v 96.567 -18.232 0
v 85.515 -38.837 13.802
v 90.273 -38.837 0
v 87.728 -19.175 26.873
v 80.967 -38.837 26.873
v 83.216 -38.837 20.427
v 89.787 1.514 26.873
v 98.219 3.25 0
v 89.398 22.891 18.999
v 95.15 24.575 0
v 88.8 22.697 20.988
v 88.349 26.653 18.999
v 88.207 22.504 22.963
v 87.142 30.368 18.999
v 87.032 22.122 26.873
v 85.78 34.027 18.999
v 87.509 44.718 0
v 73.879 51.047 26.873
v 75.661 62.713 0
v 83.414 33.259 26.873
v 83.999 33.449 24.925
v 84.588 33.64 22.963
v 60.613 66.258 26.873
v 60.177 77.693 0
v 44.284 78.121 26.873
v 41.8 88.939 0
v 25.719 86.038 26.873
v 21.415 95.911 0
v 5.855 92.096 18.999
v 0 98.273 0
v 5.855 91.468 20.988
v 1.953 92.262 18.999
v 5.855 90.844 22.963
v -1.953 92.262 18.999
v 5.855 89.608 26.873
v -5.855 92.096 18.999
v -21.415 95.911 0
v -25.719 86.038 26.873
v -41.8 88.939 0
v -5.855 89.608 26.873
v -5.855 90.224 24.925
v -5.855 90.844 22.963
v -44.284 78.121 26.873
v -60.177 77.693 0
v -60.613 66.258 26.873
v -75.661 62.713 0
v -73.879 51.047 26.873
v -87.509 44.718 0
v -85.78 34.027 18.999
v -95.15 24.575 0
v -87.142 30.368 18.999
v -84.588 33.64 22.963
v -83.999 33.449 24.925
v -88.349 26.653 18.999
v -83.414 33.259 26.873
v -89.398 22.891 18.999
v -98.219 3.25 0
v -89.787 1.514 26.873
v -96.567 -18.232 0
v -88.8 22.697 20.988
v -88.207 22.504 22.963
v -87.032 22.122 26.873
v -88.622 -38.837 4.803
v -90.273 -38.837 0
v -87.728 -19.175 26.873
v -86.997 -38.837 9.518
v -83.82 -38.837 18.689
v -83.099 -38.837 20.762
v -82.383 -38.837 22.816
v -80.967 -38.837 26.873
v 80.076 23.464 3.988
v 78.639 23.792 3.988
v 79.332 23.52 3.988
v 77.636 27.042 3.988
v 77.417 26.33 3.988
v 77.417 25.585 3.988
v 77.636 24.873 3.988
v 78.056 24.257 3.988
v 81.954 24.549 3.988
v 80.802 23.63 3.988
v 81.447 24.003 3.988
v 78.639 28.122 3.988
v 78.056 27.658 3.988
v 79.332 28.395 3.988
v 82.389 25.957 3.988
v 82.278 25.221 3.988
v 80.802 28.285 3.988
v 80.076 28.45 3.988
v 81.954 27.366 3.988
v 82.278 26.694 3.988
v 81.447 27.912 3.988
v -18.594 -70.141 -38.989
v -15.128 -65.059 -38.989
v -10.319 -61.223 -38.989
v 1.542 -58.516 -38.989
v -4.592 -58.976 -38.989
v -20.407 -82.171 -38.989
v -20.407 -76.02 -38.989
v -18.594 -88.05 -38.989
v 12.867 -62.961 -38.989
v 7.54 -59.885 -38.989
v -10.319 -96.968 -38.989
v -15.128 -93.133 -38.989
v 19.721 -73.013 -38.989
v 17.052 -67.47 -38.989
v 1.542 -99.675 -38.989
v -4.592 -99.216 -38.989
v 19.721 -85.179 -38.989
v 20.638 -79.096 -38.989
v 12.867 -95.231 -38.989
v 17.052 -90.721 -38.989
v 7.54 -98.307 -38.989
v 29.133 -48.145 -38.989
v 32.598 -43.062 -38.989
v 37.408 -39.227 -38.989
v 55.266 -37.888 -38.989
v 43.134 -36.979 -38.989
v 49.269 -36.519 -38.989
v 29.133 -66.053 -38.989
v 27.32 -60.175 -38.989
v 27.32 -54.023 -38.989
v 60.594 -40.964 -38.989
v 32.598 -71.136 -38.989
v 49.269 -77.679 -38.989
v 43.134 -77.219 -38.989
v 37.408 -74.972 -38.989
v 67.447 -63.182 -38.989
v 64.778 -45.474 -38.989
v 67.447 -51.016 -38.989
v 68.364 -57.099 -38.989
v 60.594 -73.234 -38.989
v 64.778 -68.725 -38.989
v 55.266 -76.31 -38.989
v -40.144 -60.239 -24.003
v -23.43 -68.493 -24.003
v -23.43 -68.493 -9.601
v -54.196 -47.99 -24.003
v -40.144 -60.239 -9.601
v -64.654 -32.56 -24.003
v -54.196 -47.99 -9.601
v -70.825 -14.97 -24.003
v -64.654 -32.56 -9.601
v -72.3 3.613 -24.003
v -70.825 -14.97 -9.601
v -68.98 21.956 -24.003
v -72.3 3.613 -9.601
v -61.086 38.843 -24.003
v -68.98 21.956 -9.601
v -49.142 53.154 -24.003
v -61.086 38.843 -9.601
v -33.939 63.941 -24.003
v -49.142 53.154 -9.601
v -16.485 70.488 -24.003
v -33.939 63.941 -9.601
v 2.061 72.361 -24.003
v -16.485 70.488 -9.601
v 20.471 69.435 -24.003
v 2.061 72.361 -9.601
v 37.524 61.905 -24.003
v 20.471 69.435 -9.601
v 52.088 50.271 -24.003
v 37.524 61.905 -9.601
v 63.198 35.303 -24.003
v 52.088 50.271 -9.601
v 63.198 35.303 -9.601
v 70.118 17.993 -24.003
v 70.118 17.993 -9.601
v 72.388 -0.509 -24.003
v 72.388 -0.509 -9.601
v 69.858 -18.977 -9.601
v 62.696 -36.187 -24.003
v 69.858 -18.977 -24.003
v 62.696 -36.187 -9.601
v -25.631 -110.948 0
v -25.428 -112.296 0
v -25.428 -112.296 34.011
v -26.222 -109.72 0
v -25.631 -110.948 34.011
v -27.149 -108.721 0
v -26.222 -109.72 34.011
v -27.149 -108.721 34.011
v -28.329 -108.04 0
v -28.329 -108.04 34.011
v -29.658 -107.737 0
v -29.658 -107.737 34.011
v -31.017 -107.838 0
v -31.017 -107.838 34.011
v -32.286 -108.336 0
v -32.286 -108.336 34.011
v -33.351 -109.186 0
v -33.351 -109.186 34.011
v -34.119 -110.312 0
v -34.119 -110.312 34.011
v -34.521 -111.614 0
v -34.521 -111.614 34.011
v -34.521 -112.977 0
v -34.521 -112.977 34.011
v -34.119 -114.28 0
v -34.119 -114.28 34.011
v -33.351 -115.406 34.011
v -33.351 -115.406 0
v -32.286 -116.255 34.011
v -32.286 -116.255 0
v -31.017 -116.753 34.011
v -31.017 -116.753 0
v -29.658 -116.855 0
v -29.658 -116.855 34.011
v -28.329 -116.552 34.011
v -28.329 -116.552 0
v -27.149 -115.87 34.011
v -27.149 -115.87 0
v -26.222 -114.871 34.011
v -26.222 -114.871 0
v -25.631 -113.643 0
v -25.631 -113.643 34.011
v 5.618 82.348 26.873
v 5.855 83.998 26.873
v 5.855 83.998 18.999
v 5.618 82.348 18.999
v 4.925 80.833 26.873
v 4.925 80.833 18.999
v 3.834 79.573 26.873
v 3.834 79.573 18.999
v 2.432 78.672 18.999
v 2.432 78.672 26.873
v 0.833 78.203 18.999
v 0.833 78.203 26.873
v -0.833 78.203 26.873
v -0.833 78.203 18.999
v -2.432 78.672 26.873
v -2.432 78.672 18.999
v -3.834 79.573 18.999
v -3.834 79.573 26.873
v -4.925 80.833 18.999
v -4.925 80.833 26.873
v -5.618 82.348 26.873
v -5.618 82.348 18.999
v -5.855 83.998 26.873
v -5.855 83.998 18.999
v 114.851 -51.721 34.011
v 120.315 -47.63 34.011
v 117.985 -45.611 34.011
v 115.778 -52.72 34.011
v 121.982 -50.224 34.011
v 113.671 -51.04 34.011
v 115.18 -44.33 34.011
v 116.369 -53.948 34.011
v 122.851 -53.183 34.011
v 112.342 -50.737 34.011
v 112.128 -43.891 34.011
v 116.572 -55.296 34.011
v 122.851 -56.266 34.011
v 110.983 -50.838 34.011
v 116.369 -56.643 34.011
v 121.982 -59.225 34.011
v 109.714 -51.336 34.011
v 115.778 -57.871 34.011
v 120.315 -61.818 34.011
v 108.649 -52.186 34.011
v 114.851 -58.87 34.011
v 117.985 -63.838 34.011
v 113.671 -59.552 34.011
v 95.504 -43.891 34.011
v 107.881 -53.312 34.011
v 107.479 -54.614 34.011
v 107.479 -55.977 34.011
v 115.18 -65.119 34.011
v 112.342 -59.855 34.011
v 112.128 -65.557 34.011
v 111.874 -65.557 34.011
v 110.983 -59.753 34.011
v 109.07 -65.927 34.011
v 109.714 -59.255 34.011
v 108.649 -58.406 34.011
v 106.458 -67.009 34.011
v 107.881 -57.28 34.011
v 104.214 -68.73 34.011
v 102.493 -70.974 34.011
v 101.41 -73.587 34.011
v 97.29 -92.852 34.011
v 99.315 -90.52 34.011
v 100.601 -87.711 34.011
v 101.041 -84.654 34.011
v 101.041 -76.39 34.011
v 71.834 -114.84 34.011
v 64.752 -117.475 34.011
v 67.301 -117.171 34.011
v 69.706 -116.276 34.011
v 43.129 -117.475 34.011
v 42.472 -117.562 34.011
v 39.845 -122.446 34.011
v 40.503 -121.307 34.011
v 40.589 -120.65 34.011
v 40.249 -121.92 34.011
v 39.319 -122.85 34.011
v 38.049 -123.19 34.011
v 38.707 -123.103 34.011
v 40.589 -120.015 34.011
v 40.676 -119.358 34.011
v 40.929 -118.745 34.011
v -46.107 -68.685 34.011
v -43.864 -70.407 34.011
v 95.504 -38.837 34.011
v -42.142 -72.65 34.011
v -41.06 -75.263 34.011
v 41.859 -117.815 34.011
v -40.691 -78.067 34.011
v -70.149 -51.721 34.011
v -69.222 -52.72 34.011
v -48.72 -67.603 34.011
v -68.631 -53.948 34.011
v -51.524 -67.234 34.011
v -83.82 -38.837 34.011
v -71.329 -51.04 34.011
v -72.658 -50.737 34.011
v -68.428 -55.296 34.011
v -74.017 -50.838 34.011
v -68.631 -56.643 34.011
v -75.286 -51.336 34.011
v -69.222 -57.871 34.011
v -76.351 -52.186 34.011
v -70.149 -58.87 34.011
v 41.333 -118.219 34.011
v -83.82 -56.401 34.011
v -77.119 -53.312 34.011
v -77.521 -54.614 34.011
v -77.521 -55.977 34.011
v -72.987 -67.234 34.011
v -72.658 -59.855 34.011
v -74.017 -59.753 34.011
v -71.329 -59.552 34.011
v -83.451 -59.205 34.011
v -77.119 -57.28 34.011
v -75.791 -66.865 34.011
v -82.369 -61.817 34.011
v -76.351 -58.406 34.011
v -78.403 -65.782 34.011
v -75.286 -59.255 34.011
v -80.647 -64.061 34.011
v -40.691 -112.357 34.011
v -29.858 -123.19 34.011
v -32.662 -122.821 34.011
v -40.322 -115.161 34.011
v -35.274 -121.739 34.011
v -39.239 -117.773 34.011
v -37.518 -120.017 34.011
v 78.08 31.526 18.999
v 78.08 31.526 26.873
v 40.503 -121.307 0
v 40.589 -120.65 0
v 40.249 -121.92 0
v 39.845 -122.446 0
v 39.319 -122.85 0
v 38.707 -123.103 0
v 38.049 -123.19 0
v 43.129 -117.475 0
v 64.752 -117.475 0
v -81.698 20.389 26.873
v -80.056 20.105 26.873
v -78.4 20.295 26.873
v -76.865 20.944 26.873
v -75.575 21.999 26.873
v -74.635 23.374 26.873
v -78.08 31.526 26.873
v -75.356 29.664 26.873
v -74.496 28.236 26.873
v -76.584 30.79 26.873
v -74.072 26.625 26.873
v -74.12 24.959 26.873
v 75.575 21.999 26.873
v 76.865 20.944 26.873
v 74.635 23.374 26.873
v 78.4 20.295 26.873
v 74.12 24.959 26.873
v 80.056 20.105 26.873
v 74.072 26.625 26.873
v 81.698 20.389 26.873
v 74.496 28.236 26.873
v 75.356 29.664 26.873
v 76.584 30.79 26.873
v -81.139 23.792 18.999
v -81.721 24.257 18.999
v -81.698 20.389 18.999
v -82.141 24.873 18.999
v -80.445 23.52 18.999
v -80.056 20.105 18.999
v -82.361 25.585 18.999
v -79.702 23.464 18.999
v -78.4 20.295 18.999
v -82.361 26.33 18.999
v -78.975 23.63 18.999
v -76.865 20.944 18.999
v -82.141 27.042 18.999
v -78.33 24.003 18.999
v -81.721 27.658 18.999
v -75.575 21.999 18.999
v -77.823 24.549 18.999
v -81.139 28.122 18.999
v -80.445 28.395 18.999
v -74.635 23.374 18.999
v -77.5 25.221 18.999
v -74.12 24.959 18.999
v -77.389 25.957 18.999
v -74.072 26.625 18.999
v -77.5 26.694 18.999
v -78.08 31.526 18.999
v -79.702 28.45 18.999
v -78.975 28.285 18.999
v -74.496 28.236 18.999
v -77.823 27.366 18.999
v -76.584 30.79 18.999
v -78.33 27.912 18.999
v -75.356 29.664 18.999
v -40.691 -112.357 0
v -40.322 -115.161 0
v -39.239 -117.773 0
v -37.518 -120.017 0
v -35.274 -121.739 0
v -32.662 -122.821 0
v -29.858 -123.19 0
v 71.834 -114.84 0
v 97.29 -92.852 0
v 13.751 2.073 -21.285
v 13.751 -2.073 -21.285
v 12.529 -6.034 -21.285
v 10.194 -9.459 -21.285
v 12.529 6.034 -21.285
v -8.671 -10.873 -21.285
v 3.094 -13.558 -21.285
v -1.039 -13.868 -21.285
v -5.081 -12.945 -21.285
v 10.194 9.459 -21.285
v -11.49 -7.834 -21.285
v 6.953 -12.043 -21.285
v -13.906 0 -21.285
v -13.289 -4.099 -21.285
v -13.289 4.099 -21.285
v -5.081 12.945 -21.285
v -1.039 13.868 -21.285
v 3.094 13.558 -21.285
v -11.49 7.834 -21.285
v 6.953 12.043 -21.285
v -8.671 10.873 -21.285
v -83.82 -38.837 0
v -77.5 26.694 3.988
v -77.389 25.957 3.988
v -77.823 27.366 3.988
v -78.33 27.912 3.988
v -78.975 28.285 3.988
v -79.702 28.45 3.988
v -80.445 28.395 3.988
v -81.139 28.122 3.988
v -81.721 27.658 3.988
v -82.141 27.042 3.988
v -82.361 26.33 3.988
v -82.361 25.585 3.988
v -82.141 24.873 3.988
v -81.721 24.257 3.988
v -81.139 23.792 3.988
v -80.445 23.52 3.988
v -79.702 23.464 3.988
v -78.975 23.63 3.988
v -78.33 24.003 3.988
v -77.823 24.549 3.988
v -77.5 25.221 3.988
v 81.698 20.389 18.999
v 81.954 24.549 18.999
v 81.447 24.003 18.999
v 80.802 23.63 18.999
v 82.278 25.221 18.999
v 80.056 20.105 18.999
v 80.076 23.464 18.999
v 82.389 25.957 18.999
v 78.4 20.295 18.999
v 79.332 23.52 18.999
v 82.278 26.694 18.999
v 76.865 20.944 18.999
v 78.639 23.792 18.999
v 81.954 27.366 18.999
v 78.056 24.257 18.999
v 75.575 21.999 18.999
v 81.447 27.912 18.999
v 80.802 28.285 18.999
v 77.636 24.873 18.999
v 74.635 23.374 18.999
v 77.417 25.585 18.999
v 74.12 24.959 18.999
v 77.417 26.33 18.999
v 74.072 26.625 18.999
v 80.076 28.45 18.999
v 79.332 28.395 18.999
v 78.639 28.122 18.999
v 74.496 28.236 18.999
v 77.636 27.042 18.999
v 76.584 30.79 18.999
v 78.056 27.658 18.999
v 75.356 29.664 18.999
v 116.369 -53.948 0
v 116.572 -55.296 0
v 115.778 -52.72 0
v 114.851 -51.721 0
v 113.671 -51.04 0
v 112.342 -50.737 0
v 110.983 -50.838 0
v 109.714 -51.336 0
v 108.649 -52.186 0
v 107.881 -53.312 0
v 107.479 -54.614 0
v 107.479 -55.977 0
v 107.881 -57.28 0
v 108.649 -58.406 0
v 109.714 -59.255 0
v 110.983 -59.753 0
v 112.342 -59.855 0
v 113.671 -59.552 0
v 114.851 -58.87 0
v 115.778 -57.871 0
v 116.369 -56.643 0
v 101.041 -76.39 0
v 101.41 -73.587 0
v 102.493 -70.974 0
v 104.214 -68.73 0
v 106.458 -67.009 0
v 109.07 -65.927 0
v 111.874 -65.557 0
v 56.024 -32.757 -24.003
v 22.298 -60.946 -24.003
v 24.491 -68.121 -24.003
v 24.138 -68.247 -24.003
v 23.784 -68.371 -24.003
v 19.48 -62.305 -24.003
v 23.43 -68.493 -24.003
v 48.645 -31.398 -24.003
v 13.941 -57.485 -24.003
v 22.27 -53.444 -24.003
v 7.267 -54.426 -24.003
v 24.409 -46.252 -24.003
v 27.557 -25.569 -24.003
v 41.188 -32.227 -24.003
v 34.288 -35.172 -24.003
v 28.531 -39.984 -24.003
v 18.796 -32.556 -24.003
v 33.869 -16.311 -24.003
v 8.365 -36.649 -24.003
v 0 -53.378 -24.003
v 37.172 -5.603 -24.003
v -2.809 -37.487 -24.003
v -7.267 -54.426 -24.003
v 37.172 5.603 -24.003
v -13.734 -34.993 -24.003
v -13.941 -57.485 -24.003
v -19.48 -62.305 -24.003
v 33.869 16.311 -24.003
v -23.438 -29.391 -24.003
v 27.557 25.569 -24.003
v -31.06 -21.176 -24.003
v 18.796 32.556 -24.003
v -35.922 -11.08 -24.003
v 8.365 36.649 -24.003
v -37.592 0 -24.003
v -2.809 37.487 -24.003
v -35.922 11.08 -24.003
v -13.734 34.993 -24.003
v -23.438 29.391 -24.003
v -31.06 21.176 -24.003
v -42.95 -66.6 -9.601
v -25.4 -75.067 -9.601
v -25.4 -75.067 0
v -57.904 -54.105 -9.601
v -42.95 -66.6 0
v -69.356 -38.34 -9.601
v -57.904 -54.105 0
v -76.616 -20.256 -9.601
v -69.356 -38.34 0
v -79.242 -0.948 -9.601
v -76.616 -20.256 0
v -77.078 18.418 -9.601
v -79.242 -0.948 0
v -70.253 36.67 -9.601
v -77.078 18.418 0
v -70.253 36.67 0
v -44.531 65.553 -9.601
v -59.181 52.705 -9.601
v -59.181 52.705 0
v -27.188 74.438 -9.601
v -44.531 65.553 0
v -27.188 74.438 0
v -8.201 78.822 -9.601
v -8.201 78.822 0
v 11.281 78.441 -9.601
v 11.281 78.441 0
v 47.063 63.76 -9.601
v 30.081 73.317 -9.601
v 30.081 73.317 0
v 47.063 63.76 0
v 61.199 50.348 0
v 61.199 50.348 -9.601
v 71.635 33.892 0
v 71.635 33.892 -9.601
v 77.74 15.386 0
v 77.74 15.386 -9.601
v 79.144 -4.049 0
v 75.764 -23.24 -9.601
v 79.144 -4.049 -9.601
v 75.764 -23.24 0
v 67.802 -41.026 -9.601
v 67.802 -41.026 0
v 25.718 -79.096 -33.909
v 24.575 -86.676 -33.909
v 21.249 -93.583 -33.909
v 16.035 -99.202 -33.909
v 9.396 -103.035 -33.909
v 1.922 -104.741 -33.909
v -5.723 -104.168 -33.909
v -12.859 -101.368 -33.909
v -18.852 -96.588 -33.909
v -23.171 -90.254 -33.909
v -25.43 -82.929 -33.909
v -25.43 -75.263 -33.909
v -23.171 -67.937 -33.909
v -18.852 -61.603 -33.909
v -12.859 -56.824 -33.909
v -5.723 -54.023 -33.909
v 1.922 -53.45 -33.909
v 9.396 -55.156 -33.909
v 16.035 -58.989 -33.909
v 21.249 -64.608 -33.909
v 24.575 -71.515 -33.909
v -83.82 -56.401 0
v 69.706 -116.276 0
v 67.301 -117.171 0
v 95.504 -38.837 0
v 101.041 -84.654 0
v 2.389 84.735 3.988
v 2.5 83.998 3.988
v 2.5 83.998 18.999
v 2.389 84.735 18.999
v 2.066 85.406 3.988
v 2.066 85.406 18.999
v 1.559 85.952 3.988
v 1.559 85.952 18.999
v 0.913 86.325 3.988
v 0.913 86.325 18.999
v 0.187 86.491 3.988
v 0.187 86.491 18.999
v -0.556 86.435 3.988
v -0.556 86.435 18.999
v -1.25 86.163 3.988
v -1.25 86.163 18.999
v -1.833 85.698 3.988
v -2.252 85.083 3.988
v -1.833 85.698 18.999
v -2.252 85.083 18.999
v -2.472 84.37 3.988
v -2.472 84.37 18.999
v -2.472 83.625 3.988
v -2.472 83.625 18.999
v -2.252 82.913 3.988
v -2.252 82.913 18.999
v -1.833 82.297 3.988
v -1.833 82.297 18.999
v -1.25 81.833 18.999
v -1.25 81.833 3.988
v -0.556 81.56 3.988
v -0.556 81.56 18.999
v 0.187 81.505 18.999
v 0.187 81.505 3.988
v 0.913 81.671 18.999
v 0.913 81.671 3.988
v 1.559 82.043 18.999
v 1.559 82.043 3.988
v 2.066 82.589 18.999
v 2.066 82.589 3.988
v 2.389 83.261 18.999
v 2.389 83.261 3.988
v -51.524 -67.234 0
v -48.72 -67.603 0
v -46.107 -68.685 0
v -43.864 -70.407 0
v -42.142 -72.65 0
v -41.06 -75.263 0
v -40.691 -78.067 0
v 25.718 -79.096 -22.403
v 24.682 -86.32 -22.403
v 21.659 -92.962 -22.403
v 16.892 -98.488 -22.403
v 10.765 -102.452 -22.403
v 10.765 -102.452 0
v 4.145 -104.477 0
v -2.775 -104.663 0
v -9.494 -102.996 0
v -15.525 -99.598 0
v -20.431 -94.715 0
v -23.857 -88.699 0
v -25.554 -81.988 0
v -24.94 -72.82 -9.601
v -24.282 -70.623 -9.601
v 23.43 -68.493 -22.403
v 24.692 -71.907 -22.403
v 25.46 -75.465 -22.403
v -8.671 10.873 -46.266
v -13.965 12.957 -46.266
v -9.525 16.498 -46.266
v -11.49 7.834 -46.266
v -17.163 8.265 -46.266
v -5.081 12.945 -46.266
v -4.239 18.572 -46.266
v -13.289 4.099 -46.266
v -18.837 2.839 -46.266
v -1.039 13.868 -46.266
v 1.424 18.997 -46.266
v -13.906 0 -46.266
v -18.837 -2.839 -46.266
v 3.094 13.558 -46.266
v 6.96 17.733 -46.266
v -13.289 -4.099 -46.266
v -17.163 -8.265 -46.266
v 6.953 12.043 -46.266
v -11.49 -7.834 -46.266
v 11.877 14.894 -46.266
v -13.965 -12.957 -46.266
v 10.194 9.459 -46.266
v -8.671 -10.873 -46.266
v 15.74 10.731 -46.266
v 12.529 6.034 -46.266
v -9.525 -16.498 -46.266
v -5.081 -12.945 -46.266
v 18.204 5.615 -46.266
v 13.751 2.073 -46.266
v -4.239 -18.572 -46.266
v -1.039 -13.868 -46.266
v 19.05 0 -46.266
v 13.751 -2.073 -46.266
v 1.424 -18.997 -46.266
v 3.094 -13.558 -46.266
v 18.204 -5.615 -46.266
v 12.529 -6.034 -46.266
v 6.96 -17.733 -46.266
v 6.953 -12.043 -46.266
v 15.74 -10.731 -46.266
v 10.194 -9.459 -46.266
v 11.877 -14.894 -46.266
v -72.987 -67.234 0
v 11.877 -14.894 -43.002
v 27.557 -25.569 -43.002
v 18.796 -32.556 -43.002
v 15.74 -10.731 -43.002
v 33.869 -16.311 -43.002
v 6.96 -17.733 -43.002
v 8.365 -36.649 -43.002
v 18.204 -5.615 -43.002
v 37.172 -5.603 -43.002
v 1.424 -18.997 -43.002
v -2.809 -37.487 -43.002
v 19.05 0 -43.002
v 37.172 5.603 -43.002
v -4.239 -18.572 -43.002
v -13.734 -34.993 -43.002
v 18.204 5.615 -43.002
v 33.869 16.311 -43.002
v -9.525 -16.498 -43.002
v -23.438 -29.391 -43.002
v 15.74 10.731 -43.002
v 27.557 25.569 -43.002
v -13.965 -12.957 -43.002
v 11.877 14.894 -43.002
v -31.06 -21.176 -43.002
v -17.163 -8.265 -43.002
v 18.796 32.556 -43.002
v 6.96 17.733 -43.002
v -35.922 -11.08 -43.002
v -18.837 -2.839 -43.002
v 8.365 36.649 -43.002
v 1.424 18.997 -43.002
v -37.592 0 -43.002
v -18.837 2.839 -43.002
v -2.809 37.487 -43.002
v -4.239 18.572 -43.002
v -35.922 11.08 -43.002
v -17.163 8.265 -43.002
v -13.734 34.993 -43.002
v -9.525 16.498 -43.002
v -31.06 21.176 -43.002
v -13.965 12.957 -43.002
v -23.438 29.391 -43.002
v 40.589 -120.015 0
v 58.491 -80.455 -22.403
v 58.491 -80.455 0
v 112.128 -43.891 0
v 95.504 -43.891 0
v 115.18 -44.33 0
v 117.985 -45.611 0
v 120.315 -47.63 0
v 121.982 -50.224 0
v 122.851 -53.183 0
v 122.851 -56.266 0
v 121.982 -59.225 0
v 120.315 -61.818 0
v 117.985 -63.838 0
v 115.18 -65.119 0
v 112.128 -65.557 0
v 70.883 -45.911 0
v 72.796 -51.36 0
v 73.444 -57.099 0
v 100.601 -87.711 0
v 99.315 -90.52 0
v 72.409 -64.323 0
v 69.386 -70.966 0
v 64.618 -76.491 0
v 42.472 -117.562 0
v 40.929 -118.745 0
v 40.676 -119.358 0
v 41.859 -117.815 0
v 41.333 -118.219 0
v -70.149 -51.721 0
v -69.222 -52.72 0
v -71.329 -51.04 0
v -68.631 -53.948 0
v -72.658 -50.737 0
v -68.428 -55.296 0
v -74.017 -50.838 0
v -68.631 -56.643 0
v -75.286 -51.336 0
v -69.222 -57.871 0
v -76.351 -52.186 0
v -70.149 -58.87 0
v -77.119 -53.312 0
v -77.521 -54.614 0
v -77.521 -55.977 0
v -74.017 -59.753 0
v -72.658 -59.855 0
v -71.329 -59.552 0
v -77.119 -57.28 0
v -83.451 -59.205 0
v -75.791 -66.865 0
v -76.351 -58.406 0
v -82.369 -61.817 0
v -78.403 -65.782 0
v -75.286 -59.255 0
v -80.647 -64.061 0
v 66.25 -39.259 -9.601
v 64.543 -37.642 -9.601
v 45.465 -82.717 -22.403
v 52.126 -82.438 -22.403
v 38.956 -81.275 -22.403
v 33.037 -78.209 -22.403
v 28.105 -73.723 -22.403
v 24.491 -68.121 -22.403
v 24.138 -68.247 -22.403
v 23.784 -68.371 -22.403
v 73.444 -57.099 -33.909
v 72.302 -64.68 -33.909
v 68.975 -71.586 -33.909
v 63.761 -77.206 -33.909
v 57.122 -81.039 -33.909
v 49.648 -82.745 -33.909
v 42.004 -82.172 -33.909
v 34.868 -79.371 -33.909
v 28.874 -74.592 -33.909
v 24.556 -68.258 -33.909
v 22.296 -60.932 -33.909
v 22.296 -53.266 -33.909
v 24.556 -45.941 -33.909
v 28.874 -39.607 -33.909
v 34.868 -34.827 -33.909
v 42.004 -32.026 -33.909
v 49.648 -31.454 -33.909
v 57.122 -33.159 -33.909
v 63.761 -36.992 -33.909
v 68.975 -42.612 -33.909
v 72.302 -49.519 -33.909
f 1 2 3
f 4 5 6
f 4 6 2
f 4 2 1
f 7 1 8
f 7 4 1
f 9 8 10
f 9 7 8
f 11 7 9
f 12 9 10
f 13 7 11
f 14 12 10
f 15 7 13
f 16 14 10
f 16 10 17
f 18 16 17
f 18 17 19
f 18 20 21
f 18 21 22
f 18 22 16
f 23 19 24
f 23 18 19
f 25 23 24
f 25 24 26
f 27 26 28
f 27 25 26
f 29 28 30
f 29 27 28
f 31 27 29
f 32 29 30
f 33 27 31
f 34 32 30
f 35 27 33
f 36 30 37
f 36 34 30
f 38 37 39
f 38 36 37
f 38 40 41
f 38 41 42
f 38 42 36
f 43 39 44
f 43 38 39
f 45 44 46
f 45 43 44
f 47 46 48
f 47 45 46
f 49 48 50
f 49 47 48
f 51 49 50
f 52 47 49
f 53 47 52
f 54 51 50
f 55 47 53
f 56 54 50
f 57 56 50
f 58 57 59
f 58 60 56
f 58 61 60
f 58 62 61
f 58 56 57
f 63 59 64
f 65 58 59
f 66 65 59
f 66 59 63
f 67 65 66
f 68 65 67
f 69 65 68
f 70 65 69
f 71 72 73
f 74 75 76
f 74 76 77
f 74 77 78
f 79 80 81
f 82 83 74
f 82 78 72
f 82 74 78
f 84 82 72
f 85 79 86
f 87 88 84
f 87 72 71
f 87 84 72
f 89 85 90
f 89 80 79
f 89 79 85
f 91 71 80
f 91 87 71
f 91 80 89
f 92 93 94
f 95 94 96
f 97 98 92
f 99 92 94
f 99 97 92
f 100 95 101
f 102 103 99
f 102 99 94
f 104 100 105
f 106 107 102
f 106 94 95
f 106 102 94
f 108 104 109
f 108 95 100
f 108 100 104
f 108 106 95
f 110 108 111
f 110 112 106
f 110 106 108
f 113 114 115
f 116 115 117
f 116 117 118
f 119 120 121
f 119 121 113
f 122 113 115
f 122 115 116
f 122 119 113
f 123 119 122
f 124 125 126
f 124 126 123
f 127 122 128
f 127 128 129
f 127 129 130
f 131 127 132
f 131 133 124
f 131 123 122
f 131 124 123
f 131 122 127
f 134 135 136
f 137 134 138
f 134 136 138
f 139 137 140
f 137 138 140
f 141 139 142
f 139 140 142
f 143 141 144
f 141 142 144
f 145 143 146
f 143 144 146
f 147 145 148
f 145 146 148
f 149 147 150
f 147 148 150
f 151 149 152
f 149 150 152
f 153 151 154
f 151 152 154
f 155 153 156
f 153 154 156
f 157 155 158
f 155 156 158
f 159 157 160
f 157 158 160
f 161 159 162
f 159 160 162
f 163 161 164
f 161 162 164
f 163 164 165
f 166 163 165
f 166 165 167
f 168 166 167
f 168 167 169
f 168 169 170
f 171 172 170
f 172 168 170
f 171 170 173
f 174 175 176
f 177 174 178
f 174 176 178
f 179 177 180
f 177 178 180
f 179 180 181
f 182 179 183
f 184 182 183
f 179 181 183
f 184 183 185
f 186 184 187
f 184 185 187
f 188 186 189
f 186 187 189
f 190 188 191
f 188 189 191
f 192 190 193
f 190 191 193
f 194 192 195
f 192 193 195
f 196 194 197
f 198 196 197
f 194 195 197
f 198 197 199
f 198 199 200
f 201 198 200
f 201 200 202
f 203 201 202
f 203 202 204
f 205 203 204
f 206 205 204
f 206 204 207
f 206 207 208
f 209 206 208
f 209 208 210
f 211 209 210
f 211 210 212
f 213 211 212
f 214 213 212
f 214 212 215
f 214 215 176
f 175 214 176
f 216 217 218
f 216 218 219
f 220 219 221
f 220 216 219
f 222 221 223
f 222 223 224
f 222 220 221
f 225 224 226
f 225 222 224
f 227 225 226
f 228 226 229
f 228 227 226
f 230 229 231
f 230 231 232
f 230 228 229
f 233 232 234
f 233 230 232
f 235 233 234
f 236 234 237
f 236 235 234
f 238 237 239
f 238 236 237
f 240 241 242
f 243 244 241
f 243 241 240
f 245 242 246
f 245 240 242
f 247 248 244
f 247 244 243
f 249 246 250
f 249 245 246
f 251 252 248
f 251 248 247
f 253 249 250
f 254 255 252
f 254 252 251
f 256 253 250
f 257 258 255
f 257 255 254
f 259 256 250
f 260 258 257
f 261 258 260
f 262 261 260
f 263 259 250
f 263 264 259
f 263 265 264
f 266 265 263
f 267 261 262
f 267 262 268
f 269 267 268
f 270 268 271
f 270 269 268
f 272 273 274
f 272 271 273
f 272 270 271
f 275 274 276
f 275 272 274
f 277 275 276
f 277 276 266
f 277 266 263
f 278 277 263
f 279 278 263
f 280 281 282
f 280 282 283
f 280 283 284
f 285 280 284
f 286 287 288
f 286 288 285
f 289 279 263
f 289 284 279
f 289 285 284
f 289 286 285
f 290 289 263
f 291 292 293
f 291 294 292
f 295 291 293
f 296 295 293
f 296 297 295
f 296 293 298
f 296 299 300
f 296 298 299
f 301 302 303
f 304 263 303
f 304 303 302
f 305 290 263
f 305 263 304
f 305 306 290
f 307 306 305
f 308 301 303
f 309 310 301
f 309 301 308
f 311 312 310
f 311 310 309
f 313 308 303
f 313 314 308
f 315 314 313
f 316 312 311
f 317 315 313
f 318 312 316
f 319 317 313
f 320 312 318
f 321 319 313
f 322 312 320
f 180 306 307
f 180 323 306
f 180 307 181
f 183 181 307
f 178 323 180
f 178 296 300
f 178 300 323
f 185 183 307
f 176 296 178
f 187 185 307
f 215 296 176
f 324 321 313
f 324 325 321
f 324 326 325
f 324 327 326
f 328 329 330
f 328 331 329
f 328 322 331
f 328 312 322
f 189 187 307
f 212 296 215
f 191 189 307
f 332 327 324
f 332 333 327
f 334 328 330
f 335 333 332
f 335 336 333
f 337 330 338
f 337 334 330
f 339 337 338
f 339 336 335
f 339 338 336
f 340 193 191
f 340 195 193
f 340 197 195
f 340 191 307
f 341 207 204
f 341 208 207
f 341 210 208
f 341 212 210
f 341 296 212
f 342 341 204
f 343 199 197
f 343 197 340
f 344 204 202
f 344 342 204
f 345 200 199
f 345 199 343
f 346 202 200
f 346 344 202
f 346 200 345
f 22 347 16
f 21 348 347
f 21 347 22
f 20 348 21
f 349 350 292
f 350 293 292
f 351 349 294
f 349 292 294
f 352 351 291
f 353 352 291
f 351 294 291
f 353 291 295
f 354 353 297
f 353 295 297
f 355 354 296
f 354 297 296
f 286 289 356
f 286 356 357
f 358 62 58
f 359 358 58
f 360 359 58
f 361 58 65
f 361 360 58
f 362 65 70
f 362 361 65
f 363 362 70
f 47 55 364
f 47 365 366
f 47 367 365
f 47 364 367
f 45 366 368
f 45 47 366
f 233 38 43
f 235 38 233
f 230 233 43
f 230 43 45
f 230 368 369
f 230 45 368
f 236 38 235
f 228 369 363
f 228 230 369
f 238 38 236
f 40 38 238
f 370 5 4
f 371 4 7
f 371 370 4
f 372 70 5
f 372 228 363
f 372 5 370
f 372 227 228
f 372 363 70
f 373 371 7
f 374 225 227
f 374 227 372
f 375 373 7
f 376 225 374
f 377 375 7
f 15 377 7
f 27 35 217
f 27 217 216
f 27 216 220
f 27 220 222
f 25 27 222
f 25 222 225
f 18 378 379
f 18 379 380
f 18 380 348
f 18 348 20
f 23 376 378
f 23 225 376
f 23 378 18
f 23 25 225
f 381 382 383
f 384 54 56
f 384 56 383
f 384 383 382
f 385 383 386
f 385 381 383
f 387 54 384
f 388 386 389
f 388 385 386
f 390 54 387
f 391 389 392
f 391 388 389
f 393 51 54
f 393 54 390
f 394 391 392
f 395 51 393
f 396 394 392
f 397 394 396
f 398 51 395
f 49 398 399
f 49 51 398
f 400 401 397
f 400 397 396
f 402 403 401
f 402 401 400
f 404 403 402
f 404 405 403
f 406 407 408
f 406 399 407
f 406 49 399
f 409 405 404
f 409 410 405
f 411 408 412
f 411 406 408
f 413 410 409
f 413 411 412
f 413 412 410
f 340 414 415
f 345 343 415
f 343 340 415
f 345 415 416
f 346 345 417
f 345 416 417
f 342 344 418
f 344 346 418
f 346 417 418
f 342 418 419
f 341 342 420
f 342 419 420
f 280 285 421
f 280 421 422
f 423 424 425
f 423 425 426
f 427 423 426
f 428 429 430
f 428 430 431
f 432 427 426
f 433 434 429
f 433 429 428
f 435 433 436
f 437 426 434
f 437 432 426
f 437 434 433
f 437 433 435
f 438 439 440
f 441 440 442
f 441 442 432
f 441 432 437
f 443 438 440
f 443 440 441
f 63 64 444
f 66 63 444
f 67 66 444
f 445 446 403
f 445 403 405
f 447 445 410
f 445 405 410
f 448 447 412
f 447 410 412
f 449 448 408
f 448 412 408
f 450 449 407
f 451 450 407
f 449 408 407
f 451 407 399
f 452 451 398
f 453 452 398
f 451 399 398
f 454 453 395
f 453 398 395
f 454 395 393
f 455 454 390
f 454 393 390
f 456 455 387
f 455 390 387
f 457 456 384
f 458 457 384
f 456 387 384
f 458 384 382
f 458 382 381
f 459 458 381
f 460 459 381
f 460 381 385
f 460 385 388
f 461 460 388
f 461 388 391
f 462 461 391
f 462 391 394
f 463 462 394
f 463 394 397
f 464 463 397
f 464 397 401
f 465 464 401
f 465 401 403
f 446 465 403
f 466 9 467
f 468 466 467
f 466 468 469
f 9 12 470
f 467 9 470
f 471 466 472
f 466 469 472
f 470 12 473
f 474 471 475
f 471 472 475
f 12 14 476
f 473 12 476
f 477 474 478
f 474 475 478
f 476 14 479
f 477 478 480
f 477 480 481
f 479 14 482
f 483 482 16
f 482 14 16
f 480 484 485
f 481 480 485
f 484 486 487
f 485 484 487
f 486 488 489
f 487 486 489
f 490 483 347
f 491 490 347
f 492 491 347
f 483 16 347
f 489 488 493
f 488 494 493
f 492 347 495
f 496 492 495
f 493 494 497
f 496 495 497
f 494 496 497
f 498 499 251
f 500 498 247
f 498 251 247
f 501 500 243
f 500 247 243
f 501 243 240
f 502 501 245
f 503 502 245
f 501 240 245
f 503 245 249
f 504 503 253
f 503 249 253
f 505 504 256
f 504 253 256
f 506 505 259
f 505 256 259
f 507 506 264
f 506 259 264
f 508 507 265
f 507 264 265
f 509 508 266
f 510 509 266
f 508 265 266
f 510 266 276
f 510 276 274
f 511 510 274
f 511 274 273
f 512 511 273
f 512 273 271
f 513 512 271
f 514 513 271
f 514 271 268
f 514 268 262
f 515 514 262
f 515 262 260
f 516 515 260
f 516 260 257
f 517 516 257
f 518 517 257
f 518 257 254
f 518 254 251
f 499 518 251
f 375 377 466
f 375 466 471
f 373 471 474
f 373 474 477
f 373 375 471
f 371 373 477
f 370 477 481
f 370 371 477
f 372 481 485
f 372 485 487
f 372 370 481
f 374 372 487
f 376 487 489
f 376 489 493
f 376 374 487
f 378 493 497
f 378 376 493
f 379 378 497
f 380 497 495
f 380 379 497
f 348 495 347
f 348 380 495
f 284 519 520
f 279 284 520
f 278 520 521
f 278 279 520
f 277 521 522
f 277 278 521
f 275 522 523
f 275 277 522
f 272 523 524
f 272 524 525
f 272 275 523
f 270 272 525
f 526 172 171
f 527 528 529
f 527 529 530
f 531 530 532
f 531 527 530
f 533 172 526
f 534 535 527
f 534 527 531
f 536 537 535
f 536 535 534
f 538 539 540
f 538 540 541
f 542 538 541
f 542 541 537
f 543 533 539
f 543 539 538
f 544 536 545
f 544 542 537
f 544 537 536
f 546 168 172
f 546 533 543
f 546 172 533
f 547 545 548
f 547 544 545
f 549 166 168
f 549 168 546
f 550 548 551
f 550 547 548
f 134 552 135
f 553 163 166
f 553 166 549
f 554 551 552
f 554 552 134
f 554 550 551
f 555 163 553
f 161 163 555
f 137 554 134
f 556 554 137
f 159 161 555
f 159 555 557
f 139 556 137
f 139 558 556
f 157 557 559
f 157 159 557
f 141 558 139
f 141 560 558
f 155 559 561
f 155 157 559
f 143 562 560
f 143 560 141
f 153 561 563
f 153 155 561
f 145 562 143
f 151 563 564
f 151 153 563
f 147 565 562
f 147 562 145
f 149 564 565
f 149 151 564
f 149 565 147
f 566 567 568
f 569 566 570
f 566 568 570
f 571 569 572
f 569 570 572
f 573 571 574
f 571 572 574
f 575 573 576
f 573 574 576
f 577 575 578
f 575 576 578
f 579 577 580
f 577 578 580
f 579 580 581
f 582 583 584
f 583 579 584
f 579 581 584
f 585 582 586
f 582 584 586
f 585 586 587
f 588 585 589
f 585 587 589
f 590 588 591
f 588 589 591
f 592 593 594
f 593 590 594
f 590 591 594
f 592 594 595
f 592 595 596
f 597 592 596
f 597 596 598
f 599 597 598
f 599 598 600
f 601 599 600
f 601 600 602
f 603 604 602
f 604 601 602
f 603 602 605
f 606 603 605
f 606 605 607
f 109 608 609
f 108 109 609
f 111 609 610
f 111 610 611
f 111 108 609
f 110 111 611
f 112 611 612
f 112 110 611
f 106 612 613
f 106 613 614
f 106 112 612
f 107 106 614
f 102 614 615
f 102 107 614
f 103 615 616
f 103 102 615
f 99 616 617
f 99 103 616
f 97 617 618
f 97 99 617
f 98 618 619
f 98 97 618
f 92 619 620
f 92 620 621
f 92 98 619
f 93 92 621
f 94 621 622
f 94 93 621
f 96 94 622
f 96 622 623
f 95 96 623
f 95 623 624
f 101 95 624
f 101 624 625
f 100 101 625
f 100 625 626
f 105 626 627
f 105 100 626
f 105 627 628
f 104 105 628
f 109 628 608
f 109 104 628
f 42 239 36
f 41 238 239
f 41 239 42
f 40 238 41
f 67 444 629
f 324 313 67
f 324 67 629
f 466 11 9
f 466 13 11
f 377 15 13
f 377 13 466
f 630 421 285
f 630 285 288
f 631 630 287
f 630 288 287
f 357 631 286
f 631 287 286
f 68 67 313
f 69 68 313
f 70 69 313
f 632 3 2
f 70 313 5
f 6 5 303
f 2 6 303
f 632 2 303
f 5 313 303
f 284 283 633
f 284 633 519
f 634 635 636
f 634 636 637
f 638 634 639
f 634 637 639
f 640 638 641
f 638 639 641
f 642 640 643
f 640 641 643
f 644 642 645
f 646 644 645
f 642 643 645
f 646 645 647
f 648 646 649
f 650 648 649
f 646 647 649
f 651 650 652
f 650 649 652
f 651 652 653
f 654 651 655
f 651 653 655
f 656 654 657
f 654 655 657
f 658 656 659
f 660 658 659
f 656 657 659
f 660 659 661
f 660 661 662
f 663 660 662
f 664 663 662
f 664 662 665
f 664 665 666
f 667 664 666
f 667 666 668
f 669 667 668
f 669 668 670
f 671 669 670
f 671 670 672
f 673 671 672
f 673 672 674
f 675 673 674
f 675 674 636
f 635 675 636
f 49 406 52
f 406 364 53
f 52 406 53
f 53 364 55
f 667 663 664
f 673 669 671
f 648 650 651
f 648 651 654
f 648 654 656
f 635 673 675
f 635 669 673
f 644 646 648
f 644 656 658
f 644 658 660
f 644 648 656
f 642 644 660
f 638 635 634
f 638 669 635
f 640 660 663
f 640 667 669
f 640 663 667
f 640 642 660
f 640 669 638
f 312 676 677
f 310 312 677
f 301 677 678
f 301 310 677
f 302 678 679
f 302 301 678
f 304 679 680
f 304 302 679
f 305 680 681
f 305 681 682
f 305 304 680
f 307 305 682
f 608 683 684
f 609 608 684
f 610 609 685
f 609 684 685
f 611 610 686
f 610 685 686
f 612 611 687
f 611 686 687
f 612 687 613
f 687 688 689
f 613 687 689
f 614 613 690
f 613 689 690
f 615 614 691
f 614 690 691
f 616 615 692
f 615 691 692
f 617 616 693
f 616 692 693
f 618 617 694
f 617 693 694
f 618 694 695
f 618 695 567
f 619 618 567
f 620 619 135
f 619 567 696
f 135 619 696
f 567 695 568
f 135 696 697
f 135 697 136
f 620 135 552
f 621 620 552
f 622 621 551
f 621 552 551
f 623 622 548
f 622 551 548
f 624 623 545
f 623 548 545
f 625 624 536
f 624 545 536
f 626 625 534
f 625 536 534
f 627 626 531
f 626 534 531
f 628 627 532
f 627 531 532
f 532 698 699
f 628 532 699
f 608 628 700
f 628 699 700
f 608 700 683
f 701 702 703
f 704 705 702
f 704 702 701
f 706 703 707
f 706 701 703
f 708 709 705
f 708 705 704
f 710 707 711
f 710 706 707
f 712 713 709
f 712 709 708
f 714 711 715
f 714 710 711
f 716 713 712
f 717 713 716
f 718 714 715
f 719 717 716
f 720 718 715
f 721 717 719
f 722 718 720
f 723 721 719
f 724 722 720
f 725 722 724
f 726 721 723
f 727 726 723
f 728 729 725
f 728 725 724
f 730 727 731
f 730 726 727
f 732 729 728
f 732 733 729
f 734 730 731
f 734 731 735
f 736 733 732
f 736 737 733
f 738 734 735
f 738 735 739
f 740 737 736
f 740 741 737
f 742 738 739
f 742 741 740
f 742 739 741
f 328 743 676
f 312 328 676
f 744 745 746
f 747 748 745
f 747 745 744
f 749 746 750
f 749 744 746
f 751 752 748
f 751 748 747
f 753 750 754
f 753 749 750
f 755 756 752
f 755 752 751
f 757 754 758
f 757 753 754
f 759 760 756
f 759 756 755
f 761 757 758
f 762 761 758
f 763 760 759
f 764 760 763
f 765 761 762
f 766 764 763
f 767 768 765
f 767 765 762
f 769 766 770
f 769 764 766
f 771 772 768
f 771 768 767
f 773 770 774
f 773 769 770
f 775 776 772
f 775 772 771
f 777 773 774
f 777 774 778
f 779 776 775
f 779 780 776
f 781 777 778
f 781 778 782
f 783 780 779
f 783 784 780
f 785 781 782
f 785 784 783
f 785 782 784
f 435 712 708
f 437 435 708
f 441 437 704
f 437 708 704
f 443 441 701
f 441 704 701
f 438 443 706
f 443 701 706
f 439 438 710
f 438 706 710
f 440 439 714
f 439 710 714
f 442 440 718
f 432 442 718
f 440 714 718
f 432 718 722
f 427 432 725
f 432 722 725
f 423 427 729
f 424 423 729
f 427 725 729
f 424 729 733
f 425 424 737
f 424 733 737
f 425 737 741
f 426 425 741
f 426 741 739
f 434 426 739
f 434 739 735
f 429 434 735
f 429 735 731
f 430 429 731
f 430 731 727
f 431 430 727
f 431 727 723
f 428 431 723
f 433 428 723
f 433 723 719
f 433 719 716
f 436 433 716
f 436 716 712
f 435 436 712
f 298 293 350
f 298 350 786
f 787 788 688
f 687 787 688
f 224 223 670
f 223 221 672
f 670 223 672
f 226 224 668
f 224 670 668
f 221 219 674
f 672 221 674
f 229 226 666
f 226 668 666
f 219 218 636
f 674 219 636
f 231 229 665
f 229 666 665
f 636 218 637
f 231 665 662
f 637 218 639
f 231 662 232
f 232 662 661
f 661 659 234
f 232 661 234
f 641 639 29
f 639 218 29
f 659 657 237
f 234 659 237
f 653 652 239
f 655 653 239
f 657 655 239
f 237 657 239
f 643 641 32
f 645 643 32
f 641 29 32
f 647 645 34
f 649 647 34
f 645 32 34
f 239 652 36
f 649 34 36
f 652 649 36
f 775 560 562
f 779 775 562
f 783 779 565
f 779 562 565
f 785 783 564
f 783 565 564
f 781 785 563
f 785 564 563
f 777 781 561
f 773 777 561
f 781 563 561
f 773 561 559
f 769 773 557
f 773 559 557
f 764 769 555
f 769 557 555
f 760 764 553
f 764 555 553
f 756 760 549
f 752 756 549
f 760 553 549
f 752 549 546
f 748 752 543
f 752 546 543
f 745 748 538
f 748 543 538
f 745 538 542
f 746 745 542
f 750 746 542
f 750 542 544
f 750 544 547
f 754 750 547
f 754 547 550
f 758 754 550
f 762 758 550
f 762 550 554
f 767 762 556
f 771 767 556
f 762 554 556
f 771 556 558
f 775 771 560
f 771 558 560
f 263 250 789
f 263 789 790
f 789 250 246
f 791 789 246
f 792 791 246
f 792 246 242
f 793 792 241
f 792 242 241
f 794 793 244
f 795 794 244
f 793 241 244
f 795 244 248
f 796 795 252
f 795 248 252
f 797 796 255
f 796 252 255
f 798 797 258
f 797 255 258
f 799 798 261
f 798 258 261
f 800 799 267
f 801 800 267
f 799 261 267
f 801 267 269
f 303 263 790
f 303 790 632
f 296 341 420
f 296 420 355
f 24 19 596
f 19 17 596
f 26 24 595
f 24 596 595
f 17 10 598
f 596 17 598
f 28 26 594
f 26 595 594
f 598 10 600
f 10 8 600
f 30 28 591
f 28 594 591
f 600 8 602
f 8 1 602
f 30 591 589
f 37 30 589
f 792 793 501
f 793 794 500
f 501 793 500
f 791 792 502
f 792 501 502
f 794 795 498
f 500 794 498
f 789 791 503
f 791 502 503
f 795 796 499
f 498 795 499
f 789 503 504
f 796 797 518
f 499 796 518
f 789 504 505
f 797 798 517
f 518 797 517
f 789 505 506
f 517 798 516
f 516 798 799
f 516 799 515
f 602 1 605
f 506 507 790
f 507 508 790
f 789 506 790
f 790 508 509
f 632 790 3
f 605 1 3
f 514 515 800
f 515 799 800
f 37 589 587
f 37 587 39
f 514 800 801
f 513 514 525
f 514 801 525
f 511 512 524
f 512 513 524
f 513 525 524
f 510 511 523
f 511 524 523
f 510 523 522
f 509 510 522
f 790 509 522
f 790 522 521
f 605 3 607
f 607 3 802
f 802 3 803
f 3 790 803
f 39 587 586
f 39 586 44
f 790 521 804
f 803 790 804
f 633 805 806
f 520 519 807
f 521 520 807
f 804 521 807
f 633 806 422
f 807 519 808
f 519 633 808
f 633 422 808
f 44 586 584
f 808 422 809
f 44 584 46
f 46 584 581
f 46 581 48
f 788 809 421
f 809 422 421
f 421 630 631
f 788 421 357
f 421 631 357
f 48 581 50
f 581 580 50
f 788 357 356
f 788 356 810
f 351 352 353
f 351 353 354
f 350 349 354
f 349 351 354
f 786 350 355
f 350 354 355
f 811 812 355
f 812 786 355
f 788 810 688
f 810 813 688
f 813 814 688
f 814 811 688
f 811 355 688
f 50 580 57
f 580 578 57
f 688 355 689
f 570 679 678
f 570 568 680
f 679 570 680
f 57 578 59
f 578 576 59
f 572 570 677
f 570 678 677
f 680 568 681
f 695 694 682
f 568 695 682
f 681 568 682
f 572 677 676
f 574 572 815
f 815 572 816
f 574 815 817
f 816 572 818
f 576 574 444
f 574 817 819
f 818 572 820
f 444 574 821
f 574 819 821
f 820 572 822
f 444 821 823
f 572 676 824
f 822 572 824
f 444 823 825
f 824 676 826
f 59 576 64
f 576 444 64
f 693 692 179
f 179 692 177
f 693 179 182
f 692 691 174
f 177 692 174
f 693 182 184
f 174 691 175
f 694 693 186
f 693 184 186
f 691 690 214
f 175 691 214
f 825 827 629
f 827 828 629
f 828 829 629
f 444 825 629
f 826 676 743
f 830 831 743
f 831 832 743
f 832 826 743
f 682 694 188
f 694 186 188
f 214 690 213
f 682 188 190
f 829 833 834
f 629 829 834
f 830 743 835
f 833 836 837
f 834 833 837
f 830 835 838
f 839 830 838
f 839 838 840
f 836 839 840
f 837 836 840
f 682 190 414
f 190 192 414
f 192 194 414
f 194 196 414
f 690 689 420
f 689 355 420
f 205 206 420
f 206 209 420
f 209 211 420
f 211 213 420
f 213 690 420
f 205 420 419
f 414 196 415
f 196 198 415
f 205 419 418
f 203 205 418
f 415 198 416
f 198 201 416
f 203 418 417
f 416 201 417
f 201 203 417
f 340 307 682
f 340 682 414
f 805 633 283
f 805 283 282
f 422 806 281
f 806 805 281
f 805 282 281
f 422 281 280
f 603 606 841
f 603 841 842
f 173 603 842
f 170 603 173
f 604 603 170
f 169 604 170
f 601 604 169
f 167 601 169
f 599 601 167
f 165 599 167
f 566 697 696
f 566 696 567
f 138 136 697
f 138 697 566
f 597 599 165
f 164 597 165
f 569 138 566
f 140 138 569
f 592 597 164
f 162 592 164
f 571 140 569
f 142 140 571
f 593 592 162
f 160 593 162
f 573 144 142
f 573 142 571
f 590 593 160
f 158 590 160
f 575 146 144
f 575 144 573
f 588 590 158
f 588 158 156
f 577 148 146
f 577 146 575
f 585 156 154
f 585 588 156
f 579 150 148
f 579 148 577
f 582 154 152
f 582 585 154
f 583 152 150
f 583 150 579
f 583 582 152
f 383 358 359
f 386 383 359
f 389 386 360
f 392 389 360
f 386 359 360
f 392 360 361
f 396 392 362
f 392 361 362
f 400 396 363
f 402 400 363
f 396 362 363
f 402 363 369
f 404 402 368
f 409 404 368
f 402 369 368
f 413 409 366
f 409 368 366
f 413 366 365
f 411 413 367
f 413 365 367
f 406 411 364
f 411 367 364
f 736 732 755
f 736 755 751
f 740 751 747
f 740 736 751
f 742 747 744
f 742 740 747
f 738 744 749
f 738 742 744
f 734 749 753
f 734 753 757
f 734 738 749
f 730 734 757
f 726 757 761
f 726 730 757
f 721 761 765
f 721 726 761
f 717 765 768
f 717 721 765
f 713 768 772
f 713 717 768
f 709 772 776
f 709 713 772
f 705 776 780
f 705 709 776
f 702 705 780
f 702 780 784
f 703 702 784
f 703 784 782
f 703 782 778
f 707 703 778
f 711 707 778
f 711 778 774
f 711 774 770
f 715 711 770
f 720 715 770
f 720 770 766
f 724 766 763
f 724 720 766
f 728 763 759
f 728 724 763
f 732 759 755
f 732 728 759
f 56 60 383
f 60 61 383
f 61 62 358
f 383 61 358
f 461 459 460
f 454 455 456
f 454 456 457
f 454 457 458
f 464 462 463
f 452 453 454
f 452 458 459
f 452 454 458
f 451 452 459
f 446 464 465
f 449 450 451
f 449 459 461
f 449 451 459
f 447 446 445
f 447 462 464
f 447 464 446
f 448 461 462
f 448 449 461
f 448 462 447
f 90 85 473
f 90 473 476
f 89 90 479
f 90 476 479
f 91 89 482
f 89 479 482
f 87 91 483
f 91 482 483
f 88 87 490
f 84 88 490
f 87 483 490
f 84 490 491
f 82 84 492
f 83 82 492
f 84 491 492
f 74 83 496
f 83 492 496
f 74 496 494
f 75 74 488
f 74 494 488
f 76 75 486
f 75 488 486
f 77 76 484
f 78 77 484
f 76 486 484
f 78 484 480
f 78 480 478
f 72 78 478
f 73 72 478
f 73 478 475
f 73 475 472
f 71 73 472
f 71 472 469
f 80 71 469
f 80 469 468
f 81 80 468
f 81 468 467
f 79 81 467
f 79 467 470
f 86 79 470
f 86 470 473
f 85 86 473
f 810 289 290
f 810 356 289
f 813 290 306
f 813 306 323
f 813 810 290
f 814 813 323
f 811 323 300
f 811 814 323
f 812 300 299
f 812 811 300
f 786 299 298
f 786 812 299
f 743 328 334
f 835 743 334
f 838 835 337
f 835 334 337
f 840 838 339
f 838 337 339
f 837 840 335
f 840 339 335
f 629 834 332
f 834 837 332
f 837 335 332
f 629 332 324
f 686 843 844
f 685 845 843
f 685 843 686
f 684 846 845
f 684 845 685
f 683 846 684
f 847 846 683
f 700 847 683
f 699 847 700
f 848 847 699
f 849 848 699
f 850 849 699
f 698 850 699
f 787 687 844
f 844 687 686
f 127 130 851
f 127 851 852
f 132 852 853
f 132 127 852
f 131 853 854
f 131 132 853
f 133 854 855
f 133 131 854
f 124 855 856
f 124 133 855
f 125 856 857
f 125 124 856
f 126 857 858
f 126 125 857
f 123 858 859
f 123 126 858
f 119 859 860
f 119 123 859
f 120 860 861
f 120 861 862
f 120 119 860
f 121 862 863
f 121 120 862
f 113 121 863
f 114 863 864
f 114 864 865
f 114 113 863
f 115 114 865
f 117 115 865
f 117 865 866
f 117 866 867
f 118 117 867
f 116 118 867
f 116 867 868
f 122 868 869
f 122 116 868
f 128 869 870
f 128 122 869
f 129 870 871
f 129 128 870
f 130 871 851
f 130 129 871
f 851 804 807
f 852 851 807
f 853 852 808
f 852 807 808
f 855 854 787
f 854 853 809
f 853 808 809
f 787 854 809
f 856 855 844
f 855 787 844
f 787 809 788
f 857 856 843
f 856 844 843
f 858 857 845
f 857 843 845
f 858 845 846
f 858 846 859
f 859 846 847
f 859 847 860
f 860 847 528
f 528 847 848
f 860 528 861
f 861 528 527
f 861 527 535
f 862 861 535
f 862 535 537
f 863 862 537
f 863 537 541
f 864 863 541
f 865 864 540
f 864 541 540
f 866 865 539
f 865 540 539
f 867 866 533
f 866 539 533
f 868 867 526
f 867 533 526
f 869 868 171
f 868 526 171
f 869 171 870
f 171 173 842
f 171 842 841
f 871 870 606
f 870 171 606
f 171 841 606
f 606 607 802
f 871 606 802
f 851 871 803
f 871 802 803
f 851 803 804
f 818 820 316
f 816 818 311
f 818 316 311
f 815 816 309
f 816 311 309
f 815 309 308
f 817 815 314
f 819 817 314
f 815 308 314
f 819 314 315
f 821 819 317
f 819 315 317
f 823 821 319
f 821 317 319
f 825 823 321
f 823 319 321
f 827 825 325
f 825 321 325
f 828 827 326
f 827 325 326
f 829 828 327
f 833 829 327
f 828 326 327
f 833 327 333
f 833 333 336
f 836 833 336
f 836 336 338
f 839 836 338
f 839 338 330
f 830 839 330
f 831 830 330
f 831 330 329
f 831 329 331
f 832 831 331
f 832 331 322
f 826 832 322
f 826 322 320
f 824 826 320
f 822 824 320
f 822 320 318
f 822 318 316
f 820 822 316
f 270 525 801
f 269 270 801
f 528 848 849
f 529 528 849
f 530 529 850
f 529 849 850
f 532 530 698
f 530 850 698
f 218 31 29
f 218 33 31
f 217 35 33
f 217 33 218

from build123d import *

# Parameters (mm, degrees)
SKETCH1_R                  = 98.2726
EXTRUDE1_DEPTH             = 26.8732
EXTRUDE1_TAPER             = 17.5
SKETCH2_R                  = 2.5
EXTRUDE2_DEPTH             = 22.8854
EXTRUDE3_DEPTH             = 7.874
SKETCH4_W                  = 246.961047875
SKETCH4_H                  = 84.3534
EXTRUDE4_DEPTH             = 7.1374
EXTRUDE4_DIRECTION_2_REACH = 143.553
EXTRUDE5_DEPTH             = 34.0106
EXTRUDE6_DEPTH             = 34.0106
SKETCH8_R                  = 25.7175
EXTRUDE7_DEPTH             = 38.989
SKETCH9_R                  = 79.248
EXTRUDE9_DEPTH             = 9.6012
SKETCH10_R                 = 72.39
EXTRUDE10_DEPTH            = 14.4018
SKETCH11_R                 = 37.592
EXTRUDE11_DEPTH            = 18.9992
SKETCH12_R                 = 13.9065
EXTRUDE12_DEPTH            = 21.717
EXTRUDE13_DEPTH            = 22.4028
CHAMFER1_SIZE              = 5.08
FILLET1_R                  = 10.8331
FILLET2_R                  = 2.54
SKETCH17_R                 = 4.572
EXTRUDE14_DEPTH            = 191.331955682
EXTRUDE15_START            = 3.2639
SKETCH18_R                 = 19.05
SKETCH18_R_2               = 13.9065
EXTRUDE15_DEPTH            = 3.2639


with BuildPart() as part:
    # Sketch1 → Extrude1 (new body)
    with BuildSketch(Plane.XY):
        Circle(SKETCH1_R)
    extrude(amount=EXTRUDE1_DEPTH, taper=EXTRUDE1_TAPER)

    # Sketch2 → Extrude2 (cut)
    with BuildSketch(Plane.XY.offset(26.8732)):
        with Locations((0, 83.9978)):
            Circle(SKETCH2_R)
        with Locations((-79.888747369, 25.957427527)):
            Circle(SKETCH2_R)
        with Locations((79.888747369, 25.957427527)):
            Circle(SKETCH2_R)
    extrude(amount=-EXTRUDE2_DEPTH, mode=Mode.SUBTRACT)

    # Sketch3 → Extrude3 (cut)
    with BuildSketch(Plane.XY.offset(26.8732)):
        with BuildLine():
            Line((-5.8547, 83.9978), (-5.8547, 107.083482694))
            Line((-5.8547, 107.083482694), (5.8547, 107.083482694))
            Line((5.8547, 107.083482694), (5.8547, 83.9978))
            ThreePointArc((5.8547, 83.9978), (0, 78.1431), (-5.8547, 83.9978))
        make_face()
        with BuildLine():
            Line((78.079545572, 31.525578113), (107.519879311, 41.091322409))
            Line((107.519879311, 41.091322409), (110.140650445, 33.912588651))
            Line((110.140650445, 33.912588651), (111.136243984, 29.954358751))
            Line((111.136243984, 29.954358751), (81.697949166, 20.389276942))
            ThreePointArc((81.697949166, 20.389276942), (74.320596783, 24.148225731), (78.079545572, 31.525578113))
        make_face()
        with BuildLine():
            Line((-78.079545572, 31.525578113), (-100.241812355, 38.726535104))
            Line((-100.241812355, 38.726535104), (-103.860215949, 27.590233933))
            Line((-103.860215949, 27.590233933), (-81.697949166, 20.389276942))
            ThreePointArc((-81.697949166, 20.389276942), (-74.320596783, 24.148225731), (-78.079545572, 31.525578113))
        make_face()
    extrude(amount=-EXTRUDE3_DEPTH, mode=Mode.SUBTRACT)

    # Sketch4 → Extrude4 (add)
    with BuildSketch(Plane.XY.offset(26.8732)):
        with Locations((9.213520109, -81.0133)):
            Rectangle(SKETCH4_W, SKETCH4_H)
    extrude(amount=EXTRUDE4_DEPTH)

    # Extrude4 direction 2: up to this face of the body (flat: up to its plane)
    extrude4_direction_2_end = Plane(part.part.faces().sort_by_distance((0, 0, 0))[0])
    # Sketch4 → Extrude4 direction 2 (add, up to the picked face)
    with BuildSketch(Plane.XY.offset(26.8732), mode=Mode.PRIVATE) as extrude4_direction_2_sk1:
        with Locations((9.213520109, -81.0133)):
            Rectangle(SKETCH4_W, SKETCH4_H)
    extrude4_direction_2_tool1 = split(extrude(extrude4_direction_2_sk1.sketch, amount=-EXTRUDE4_DIRECTION_2_REACH, mode=Mode.PRIVATE), bisect_by=extrude4_direction_2_end, keep=Keep.BOTH, mode=Mode.PRIVATE)
    add(extrude4_direction_2_tool1.solids().sort_by(Axis((9.21352, -81.0133, 26.8732), (0, 0, -1)))[0])

    # Sketch5 → Extrude5 (cut)
    with BuildSketch(Plane.XY.offset(34.0106)):
        Polygon((-83.82, -67.2338), (-40.6908, -67.2338), (-40.6908, -176.31524759), (-133.730255454, -176.31524759), (-133.730255454, -141.532127837), (-175.240717896, -141.532127837), (-175.240717896, -38.8366), (-83.82, -38.8366), align=None)
    extrude(amount=-EXTRUDE5_DEPTH, mode=Mode.SUBTRACT)

    # Sketch6 → Extrude6 (cut)
    with BuildSketch(Plane.XY.offset(34.0106)):
        Polygon((40.5892, -117.475), (68.7832, -117.475), (101.0412, -89.6112), (101.0412, -65.5574), (122.9614, -65.5574), (122.9614, -43.8912), (95.504, -43.8912), (95.504, -38.8366), (122.9614, -38.8366), (122.9614, 0), (187.241229942, 0), (187.241229942, -89.6112), (148.373467802, -89.6112), (148.373467802, -112.172308269), (148.373467802, -172.462981515), (68.7832, -172.462981515), (40.5892, -172.462981515), align=None)
    extrude(amount=-EXTRUDE6_DEPTH, mode=Mode.SUBTRACT)

    # Sketch8 → Extrude7 (add)
    with BuildSketch(Plane(origin=(0, 0, 0), x_dir=(-1, 0, 0), z_dir=(0, 0, -1))):
        with Locations(Location((0, -79.0956, 0), (0, 0, 180))):
            Circle(SKETCH8_R)
        with Locations(Location((-47.7266, -57.0992, 0), (0, 0, 180))):
            Circle(SKETCH8_R)
    extrude(amount=EXTRUDE7_DEPTH)

    # Sketch9 → Extrude9 (add)
    with BuildSketch(Plane(origin=(0, 0, 0), x_dir=(-1, 0, 0), z_dir=(0, 0, -1))):
        Circle(SKETCH9_R)
    extrude(amount=EXTRUDE9_DEPTH)

    # Sketch10 → Extrude10 (add)
    with BuildSketch(Plane(origin=(0, 0, -9.6012), x_dir=(-1, 0, 0), z_dir=(0, 0, -1))):
        Circle(SKETCH10_R)
    extrude(amount=EXTRUDE10_DEPTH)

    # Sketch11 → Extrude11 (add)
    with BuildSketch(Plane(origin=(0, 0, -24.003), x_dir=(-1, 0, 0), z_dir=(0, 0, -1))):
        Circle(SKETCH11_R)
    extrude(amount=EXTRUDE11_DEPTH)

    # Sketch12 → Extrude12 (cut)
    with BuildSketch(Plane(origin=(0, 0, -43.0022), x_dir=(-1, 0, 0), z_dir=(0, 0, -1))):
        Circle(SKETCH12_R)
    extrude(amount=-EXTRUDE12_DEPTH, mode=Mode.SUBTRACT)

    # Sketch13 → Extrude13 (add)
    with BuildSketch(Plane(origin=(0, 0, 0), x_dir=(-1, 0, 0), z_dir=(0, 0, -1))):
        with BuildLine():
            Line((-58.491115046, -80.455463016), (-10.764515046, -102.451863016))
            ThreePointArc((-10.764515046, -102.451863016), (23.356263016, -89.860115046), (10.764515046, -55.739336984))
            Line((10.764515046, -55.739336984), (-36.962084954, -33.742936984))
            ThreePointArc((-36.962084954, -33.742936984), (-71.082863016, -46.334684954), (-58.491115046, -80.455463016))
        make_face()
    extrude(amount=EXTRUDE13_DEPTH)

    # Chamfer1
    chamfer1_edges = [part.edges().sort_by_distance(p)[0] for p in [
        (-25.7175, -79.0956, -38.989),
        (22.0091, -57.0992, -38.989),
    ]]
    chamfer(chamfer1_edges, length=CHAMFER1_SIZE)

    # Fillet1
    # the kernel refuses this fillet: 10.8331 mm, written as the material it adds along each edge
    with BuildSketch(Plane(origin=(101.0412, -65.5574, 34.0106), x_dir=(1, 0, 0), z_dir=(0, 0, -1)), Plane(origin=(-40.6908, -67.2338, 34.0106), x_dir=(0, -1, 0), z_dir=(0, 0, -1))) as fillet1_piece_1:
        with BuildLine():
            CenterArc((FILLET1_R, FILLET1_R), FILLET1_R, 180, 90)
            Line((0, FILLET1_R), (0, 0))
            Line((0, 0), (FILLET1_R, 0))
        make_face()
    extrude(amount=34.0106)
    # the kernel refuses this fillet: 10.8331 mm, written as the material it takes off along each edge
    with BuildSketch(Plane(origin=(122.9614, -65.5574, 61.09335), x_dir=(0, 1, 0), z_dir=(0, 0, -1)), Plane(origin=(122.9614, -43.8912, 61.09335), x_dir=(-1, 0, 0), z_dir=(0, 0, -1)), Plane(origin=(-83.82, -67.2338, 61.09335), x_dir=(1, 0, 0), z_dir=(0, 0, -1))) as fillet1_2_piece_1:
        with BuildLine():
            CenterArc((FILLET1_R, -FILLET1_R), FILLET1_R, 90, 90)
            Line((0, -FILLET1_R), (0, 0))
            Line((0, 0), (FILLET1_R, 0))
        make_face()
    extrude(amount=88.1761, mode=Mode.SUBTRACT)
    with BuildSketch(Plane(origin=(101.0412, -89.6112, 46.404396211), x_dir=(0, 1, 0), z_dir=(0, 0, -1))) as fillet1_2_piece_2:
        with BuildLine():
            CenterArc((FILLET1_R * 0.457626947463, -FILLET1_R), FILLET1_R, 90, 49.180218113)
            Line((-FILLET1_R * 0.299142463693, -FILLET1_R * 0.346318075561), (0, 0))
            Line((0, 0), (FILLET1_R * 0.457626947463, 0))
        make_face()
    extrude(amount=58.798192423, mode=Mode.SUBTRACT)
    with BuildSketch(Plane(origin=(68.7832, -117.475, 44.08790669), x_dir=(0.7567694111558876, 0.6536819244393799, 0), z_dir=(0, 0, -1))) as fillet1_2_piece_3:
        with BuildLine():
            CenterArc((FILLET1_R * 0.372093184392, -FILLET1_R), FILLET1_R, 90, 40.819781887)
            Line((-FILLET1_R * 0.281588740047, -FILLET1_R * 0.243230588844), (0, 0))
            Line((0, 0), (FILLET1_R * 0.372093184392, 0))
        make_face()
    extrude(amount=54.165213379, mode=Mode.SUBTRACT)
    with BuildSketch(Plane(origin=(-40.6908, -123.19, -27.08275), x_dir=(1, 0, 0), z_dir=(0, 0, 1))) as fillet1_2_piece_4:
        with BuildLine():
            CenterArc((FILLET1_R, FILLET1_R), FILLET1_R, 180, 90)
            Line((0, FILLET1_R), (0, 0))
            Line((0, 0), (FILLET1_R, 0))
        make_face()
    extrude(amount=88.1761, mode=Mode.SUBTRACT)

    # Fillet2
    fillet2_edges = [part.edges().sort_by_distance(p)[0] for p in [
        (40.5892, -123.19, 17.0053),
        (40.5892, -117.475, 17.0053),
    ]]
    fillet(fillet2_edges, radius=FILLET2_R)

    # Sketch17 → Extrude14 (cut, through all)
    with BuildSketch(Plane.XY.offset(34.0106)):
        with Locations((-72.9996, -55.2958)):
            Circle(SKETCH17_R)
        with Locations((112.000400002, -55.2958)):
            Circle(SKETCH17_R)
        with Locations((-29.999599996, -112.295800021)):
            Circle(SKETCH17_R)
    extrude(amount=-EXTRUDE14_DEPTH, mode=Mode.SUBTRACT)

    # Sketch18 → Extrude15 (add)
    with BuildSketch(Plane(origin=(0, 0, -43.0022), x_dir=(-1, 0, 0), z_dir=(0, 0, -1)).offset(EXTRUDE15_START)):
        with Locations(Location((0, 0, 0), (0, 0, 180))):
            Circle(SKETCH18_R)
        Circle(SKETCH18_R_2, mode=Mode.SUBTRACT)
    extrude(amount=-EXTRUDE15_DEPTH)


solid = part.part
